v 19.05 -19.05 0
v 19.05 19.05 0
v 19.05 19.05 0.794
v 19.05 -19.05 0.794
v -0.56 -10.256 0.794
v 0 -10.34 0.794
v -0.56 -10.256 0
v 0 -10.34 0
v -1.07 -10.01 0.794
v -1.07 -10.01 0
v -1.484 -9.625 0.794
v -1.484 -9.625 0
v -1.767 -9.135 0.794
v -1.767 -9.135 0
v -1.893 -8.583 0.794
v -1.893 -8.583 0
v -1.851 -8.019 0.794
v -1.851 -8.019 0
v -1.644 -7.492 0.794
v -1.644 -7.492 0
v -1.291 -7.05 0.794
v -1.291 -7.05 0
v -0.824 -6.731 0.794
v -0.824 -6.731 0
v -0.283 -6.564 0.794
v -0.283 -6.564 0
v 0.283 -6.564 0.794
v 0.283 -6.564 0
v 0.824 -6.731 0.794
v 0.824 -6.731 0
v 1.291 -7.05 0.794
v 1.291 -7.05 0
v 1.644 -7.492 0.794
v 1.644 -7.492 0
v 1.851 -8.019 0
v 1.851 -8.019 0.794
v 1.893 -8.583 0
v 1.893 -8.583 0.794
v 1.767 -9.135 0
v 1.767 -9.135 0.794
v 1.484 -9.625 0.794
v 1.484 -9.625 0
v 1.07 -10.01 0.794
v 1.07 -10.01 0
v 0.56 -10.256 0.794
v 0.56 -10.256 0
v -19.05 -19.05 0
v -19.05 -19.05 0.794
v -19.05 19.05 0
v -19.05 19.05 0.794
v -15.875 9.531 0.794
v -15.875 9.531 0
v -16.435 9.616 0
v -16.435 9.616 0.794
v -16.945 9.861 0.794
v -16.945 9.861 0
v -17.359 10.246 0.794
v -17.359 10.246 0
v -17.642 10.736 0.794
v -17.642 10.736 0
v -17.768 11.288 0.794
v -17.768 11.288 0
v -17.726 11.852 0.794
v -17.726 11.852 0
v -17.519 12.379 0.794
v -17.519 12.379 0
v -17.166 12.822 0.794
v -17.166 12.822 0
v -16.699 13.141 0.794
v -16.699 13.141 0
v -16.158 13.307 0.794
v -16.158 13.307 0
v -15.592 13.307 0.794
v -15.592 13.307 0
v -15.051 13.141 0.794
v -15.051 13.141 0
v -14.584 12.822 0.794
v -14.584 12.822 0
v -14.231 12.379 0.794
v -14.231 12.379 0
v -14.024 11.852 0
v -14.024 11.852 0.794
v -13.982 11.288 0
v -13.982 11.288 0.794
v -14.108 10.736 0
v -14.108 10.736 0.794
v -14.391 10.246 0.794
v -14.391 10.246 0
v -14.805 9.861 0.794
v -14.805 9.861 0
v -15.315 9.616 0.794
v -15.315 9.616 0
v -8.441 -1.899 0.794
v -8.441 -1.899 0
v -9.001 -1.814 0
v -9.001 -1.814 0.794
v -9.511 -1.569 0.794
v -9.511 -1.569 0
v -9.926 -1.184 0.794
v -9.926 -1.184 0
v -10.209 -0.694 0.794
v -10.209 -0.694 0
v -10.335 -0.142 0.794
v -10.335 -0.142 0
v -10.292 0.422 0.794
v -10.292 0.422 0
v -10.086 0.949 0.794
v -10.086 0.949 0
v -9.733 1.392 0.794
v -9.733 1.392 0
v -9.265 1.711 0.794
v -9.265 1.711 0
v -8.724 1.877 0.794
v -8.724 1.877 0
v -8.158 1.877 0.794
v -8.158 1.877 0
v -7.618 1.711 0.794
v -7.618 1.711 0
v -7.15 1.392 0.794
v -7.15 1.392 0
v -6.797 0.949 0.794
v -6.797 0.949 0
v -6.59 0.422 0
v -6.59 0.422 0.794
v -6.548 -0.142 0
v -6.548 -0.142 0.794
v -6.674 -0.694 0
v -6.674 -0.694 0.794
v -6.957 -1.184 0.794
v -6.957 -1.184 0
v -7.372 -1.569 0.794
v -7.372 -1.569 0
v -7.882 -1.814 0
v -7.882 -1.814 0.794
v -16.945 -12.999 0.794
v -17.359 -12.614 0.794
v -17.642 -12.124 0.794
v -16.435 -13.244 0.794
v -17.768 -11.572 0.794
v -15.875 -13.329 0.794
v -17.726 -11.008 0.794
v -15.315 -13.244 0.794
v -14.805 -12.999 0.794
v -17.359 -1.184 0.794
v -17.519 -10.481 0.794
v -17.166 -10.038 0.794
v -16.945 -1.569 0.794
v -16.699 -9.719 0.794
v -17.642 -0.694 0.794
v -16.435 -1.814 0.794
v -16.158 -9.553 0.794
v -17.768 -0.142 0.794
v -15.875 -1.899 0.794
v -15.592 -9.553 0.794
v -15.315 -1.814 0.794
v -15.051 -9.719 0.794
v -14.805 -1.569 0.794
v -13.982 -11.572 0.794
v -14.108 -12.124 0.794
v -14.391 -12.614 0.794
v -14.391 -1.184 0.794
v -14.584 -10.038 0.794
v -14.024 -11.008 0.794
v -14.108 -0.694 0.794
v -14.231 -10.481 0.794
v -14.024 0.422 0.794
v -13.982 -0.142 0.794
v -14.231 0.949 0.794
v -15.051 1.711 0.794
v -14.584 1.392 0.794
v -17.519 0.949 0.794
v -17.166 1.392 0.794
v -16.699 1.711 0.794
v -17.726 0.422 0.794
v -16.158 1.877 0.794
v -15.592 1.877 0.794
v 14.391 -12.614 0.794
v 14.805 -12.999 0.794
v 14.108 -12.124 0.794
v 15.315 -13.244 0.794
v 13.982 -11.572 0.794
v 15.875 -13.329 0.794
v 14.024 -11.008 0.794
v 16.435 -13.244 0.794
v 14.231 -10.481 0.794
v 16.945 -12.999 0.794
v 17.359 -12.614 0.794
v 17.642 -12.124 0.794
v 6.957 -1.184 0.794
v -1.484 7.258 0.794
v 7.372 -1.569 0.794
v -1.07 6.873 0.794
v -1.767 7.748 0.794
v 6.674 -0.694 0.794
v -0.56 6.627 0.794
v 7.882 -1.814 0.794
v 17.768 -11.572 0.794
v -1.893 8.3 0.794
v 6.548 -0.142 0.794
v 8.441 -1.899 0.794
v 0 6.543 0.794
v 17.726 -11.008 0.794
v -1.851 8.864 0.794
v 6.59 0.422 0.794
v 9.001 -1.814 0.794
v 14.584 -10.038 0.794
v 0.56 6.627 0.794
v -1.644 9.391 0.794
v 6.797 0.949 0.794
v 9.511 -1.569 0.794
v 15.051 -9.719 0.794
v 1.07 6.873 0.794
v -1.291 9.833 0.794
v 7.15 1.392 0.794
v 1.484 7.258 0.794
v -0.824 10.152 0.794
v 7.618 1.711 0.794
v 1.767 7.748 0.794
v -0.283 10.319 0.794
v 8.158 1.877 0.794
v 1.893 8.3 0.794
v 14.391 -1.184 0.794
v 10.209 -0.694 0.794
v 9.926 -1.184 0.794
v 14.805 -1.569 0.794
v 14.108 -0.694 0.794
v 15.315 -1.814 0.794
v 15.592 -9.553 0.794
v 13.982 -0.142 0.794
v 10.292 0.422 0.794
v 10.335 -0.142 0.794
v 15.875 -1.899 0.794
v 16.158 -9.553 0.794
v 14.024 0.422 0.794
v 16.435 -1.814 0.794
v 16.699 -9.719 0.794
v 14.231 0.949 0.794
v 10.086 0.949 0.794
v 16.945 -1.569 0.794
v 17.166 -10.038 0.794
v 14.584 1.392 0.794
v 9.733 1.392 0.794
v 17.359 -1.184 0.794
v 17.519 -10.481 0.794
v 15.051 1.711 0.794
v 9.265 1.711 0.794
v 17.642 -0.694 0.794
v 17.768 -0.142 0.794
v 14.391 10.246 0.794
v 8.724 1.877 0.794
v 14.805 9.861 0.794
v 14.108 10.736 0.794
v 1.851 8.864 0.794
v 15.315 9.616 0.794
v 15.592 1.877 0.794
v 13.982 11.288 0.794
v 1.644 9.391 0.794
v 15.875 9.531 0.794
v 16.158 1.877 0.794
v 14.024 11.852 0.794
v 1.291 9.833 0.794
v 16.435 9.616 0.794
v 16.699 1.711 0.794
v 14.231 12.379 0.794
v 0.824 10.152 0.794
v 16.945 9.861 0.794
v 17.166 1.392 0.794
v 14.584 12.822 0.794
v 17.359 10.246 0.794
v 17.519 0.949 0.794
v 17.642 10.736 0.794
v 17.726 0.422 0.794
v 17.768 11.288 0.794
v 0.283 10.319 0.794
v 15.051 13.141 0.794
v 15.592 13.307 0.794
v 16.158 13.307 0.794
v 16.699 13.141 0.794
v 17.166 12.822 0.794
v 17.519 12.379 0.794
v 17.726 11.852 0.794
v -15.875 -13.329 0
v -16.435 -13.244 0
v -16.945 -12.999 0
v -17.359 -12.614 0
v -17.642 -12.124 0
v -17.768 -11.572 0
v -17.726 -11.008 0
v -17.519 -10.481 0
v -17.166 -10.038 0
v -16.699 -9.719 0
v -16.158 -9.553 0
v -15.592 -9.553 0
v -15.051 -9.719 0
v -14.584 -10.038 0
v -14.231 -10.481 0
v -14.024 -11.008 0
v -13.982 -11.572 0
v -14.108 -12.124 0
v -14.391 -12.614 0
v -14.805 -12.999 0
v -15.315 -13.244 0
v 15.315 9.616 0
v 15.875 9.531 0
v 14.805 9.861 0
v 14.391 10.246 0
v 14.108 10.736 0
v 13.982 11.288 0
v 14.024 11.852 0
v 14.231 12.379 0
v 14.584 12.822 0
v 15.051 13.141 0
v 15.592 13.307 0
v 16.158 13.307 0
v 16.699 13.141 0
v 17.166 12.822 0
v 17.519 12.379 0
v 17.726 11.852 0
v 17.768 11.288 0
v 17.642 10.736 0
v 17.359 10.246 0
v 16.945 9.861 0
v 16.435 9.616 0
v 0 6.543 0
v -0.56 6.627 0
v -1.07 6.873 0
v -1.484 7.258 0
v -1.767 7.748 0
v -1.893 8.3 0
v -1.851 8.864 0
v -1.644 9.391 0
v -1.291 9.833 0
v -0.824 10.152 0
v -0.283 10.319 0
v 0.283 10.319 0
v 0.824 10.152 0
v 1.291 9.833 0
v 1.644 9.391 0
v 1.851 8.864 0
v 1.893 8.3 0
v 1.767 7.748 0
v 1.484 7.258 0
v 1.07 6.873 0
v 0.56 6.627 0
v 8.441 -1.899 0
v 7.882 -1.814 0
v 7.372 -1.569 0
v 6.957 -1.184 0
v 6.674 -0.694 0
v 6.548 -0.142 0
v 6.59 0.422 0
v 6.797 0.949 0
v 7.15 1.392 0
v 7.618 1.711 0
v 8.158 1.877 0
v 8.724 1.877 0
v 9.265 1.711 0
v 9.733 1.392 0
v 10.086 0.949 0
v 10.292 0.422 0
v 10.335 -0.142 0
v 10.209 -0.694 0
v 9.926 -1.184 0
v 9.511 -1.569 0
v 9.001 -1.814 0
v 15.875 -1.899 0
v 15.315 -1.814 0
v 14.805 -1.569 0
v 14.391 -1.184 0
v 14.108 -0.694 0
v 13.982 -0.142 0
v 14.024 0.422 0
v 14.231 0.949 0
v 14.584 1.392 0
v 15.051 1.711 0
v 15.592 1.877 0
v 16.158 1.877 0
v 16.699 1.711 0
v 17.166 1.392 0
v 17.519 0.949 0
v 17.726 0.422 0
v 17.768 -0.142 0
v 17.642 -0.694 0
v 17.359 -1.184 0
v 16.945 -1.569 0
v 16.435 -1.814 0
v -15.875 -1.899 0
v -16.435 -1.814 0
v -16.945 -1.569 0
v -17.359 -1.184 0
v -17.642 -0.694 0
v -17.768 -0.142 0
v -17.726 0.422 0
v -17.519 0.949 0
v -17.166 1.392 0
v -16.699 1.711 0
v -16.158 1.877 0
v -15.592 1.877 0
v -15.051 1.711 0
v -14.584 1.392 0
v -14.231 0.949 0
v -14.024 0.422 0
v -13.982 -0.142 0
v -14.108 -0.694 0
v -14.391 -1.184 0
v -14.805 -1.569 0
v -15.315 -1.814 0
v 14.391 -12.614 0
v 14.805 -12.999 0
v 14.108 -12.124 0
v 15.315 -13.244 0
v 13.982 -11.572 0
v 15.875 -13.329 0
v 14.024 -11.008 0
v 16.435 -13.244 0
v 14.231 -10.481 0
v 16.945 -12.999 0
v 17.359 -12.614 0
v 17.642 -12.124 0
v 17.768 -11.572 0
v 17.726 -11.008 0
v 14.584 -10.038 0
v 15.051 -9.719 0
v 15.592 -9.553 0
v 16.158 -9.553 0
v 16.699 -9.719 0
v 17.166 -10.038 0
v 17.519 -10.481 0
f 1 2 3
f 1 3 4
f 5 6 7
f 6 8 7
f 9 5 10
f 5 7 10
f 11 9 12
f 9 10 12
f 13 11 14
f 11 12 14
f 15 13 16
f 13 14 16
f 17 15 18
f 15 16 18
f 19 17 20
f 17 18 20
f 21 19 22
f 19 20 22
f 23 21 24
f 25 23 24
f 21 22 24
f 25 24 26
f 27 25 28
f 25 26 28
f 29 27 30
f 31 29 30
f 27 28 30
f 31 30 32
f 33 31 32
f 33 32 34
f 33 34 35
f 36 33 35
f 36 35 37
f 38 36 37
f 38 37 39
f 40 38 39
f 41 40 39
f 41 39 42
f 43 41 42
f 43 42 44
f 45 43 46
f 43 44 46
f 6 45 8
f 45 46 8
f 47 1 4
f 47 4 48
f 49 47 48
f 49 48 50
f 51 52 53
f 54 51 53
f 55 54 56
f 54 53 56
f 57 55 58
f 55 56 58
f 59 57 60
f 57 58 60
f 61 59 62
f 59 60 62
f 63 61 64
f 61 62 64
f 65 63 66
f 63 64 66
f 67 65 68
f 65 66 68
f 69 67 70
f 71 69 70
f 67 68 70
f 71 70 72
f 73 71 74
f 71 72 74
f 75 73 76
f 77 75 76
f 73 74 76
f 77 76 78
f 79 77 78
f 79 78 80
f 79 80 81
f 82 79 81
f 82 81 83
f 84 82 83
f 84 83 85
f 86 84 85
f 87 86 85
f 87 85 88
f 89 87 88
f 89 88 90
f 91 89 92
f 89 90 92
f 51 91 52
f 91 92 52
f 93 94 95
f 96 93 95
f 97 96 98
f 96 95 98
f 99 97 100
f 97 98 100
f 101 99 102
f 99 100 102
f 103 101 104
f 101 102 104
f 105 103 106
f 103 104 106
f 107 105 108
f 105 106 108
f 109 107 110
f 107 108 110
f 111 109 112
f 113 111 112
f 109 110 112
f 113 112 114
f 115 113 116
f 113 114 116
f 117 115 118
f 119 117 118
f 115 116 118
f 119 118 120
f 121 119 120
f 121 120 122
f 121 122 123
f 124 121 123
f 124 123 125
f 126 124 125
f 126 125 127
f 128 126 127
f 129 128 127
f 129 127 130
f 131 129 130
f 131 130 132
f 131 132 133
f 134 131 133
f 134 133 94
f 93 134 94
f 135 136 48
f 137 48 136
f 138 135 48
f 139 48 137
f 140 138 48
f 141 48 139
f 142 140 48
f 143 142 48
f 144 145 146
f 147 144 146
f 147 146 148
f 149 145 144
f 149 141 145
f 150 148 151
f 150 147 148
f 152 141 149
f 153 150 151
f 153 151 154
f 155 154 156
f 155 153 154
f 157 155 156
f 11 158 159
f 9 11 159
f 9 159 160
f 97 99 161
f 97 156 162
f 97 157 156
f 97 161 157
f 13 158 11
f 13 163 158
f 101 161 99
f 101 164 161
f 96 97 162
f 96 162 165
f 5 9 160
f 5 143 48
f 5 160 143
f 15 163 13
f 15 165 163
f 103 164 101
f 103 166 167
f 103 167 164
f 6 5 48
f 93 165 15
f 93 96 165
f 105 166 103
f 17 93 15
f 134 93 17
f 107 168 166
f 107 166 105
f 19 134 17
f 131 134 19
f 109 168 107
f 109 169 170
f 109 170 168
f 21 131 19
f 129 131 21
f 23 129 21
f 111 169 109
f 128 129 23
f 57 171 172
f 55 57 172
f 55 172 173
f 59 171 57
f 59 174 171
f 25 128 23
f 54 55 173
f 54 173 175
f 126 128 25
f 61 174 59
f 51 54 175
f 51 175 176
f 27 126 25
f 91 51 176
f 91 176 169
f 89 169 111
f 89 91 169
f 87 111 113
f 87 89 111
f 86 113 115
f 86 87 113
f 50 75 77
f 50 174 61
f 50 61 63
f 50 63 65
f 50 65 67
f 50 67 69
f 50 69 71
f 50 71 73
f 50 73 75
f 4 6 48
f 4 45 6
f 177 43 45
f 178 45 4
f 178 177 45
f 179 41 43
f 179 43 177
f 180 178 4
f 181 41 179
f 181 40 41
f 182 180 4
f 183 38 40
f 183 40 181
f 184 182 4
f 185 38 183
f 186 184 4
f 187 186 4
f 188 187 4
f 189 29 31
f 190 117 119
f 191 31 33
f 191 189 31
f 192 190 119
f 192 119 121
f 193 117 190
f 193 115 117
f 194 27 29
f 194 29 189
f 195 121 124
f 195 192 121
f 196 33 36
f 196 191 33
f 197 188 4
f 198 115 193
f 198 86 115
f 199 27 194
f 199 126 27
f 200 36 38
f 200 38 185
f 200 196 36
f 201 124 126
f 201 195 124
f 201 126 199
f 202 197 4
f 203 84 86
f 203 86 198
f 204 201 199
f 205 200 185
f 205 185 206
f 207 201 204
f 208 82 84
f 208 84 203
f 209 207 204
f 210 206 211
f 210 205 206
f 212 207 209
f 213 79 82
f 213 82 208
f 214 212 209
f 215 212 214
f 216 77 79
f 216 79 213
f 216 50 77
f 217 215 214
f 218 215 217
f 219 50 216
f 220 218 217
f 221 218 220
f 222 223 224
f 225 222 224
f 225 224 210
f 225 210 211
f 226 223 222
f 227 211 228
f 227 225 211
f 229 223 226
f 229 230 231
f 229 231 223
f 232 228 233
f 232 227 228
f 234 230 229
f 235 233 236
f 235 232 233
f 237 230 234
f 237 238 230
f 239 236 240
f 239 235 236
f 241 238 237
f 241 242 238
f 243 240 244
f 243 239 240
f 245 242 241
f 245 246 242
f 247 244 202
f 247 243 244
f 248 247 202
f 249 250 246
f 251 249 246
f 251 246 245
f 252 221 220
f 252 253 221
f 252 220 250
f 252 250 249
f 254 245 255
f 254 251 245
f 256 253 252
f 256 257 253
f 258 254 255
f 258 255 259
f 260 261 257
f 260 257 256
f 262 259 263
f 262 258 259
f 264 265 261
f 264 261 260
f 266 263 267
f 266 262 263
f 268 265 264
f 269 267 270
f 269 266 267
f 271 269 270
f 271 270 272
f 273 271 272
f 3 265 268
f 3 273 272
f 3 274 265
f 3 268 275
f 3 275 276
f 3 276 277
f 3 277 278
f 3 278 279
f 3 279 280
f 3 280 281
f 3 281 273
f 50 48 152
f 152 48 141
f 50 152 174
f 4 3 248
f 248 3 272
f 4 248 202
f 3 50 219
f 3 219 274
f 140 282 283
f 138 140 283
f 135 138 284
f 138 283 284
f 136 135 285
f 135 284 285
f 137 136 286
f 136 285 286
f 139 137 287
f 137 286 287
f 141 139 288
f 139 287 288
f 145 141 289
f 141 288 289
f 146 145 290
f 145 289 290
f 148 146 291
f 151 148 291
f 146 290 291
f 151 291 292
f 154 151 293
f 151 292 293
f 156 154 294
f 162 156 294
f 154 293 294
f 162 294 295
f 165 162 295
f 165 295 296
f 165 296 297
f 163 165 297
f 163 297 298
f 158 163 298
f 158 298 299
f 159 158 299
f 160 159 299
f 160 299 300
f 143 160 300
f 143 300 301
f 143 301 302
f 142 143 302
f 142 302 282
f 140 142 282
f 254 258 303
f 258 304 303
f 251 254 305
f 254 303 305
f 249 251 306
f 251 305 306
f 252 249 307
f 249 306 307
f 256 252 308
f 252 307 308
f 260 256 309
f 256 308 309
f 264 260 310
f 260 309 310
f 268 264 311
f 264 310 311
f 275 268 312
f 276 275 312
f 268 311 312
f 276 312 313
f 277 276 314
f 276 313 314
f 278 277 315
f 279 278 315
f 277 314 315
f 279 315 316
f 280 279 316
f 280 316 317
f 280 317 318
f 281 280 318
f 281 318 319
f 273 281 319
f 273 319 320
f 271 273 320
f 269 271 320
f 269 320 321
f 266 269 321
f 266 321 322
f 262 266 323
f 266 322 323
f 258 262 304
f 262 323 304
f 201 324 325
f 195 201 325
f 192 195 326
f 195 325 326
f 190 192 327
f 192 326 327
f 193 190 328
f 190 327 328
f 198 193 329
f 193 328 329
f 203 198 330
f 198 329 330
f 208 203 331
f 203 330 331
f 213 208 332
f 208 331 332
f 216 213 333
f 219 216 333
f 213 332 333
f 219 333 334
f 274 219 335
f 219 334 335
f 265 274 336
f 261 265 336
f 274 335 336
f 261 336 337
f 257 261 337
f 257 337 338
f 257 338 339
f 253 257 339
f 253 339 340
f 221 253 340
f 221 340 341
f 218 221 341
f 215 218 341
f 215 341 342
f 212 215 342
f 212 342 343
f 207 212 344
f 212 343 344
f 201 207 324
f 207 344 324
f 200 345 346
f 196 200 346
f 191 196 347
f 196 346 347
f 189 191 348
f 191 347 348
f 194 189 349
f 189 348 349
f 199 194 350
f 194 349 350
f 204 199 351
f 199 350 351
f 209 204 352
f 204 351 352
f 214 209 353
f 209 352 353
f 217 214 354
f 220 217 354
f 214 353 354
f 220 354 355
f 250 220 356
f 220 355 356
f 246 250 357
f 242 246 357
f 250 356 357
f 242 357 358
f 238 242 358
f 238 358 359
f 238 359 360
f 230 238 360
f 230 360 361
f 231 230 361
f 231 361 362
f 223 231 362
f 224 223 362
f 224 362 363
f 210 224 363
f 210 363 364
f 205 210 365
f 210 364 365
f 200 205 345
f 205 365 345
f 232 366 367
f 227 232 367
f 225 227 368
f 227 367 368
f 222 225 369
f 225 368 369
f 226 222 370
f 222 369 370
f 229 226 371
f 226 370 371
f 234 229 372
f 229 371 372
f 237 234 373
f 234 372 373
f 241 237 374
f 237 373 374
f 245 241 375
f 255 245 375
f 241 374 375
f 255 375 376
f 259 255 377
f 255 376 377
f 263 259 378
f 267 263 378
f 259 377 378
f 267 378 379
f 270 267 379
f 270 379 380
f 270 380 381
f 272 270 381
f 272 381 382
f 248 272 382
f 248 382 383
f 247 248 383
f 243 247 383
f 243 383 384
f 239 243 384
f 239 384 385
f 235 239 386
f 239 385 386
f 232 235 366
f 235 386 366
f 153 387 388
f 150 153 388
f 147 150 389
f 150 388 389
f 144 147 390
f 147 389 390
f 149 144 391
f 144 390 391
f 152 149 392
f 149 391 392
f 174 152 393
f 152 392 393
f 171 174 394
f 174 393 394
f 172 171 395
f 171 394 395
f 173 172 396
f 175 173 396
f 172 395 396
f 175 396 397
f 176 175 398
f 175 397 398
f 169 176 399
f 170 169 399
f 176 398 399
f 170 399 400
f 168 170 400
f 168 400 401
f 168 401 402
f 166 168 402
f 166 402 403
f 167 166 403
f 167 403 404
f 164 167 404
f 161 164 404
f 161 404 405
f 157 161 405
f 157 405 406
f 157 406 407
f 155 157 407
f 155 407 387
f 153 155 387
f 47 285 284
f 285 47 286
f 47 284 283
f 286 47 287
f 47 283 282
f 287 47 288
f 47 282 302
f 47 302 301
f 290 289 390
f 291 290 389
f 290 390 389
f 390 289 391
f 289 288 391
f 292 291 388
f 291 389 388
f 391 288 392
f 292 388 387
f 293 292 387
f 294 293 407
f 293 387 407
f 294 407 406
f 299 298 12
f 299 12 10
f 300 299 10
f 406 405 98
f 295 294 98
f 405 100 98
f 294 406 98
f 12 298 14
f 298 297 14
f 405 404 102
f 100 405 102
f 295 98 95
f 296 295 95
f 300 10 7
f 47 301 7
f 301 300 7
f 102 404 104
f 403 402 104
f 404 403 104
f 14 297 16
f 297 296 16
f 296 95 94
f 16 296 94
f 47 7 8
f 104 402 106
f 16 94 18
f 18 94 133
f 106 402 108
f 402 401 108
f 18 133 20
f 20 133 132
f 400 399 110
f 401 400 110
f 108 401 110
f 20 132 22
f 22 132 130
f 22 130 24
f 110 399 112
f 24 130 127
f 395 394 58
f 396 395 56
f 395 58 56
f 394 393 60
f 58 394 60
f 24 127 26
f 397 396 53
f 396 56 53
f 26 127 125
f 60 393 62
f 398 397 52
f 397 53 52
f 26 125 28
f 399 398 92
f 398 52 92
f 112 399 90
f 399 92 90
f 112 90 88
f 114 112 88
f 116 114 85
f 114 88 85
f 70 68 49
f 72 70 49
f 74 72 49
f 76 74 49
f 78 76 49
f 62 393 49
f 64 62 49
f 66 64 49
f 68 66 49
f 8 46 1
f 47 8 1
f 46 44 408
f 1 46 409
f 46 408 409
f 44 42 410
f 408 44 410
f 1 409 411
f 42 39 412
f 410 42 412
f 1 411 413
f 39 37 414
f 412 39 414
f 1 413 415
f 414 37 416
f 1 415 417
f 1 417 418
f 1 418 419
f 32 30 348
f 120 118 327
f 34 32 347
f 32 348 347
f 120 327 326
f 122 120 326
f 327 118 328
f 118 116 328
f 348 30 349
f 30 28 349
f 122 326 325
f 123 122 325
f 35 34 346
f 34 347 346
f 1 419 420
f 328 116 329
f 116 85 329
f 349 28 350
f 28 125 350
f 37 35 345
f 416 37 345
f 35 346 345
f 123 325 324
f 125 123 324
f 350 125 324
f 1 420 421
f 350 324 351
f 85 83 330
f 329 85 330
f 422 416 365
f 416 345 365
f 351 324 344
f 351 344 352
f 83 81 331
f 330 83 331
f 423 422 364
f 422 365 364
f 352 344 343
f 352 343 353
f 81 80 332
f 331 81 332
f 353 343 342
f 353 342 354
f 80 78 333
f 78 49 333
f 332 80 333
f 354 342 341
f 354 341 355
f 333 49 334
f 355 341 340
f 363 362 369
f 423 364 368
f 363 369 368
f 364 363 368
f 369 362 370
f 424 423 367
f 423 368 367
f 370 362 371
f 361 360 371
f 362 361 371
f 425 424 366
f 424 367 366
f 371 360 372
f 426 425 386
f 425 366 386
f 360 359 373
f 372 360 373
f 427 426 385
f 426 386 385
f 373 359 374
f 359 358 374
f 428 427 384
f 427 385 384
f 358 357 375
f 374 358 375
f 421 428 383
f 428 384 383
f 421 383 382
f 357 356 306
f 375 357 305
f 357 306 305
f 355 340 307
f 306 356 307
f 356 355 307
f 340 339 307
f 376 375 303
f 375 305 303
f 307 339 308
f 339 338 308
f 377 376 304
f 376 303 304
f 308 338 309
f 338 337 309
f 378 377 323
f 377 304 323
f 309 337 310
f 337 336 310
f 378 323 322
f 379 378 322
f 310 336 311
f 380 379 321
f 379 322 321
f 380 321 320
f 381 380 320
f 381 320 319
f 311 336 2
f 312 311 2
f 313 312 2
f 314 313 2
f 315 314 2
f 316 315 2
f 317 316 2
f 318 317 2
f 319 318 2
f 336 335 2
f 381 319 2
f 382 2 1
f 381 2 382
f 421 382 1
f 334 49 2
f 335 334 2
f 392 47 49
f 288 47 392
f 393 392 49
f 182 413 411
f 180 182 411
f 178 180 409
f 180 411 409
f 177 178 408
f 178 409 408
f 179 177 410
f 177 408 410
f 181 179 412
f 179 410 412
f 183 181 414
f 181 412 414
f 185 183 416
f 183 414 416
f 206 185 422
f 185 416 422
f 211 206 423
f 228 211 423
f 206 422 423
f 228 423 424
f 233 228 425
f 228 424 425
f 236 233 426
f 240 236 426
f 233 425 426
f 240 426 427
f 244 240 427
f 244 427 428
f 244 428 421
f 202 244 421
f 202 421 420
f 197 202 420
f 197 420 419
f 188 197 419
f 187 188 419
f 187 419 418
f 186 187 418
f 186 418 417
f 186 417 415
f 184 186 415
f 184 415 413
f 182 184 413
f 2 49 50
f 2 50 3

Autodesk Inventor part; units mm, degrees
ref_plane "YZ Plane" through (0, 0, 0) normal (1, 0, 0) x (0, 1, 0)
ref_plane "XZ Plane" through (0, 0, 0) normal (0, 1, 0) x (-1, 0, 0)
ref_plane "XY Plane" through (0, 0, 0) normal (0, 0, 1) x (1, 0, 0)
sketch "adapter-hole-geometry" plane through (0, 0, 0) normal (0, 0, 1) x (1, 0, 0)
  line L0 (15.875, -11.43) -> (-15.875, -11.43) construction
  line L1 (-15.875, -11.43) -> (-15.875, 11.43) construction
  line L2 (-15.875, 11.43) -> (15.875, 11.43) construction
  line L3 (15.875, 11.43) -> (15.875, -11.43) construction
  line L4 (15.875, -11.43) -> (-15.875, 11.43) construction
  line L5 (-15.875, -11.43) -> (15.875, 11.43) construction
  line L6 (11.43, -15.875) -> (-11.43, -15.875) construction
  line L7 (-11.43, -15.875) -> (-11.43, 15.875) construction
  line L8 (-11.43, 15.875) -> (11.43, 15.875) construction
  line L9 (11.43, 15.875) -> (11.43, -15.875) construction
  line L10 (11.43, -15.875) -> (-11.43, 15.875) construction
  line L11 (-11.43, -15.875) -> (11.43, 15.875) construction
  line L12 (0, -8.4414) -> (8.4414, 0) construction
  line L13 (8.4414, 0) -> (0, 8.4414) construction
  line L14 (0, 8.4414) -> (-8.4414, 0) construction
  line L15 (-8.4414, 0) -> (0, -8.4414) construction
  line L16 (-5.969, -5.969) -> (5.969, 5.969) construction
  line L17 (5.969, -5.969) -> (-5.969, 5.969) construction
  line L18 (-8.4414, -8.4414) -> (8.4414, -8.4414) construction
  line L19 (8.4414, -8.4414) -> (8.4414, 8.4414) construction
  line L20 (8.4414, 8.4414) -> (-8.4414, 8.4414) construction
  line L21 (-8.4414, 8.4414) -> (-8.4414, -8.4414) construction
  line L22 (-8.4414, -8.4414) -> (8.4414, 8.4414) construction
  line L23 (8.4414, -8.4414) -> (-8.4414, 8.4414) construction
  point P0 (0, 0)
  point P1 (0, 8.4414)
  point P2 (8.4414, 0)
  dimension "d29" = 31.75
  dimension "d30" = 22.86
  dimension "d31" = 22.86
  dimension "d32" = 31.75
  dimension "d33" = 11.938
  dimension "d34" = 11.938
  dimension "d42" = 16.8829
  dimension "d43" = 16.8829
  dimension "d58" = 4.445
  dimension "d59" = 7.4336
  dimension "d60" = 5.969
  dimension "d61" = 5.969
  dimension "d62" = 4.445
  dimension "d63" = 7.4336
  dimension "d64" = 9.906
  dimension "d65" = 9.906
  dimension "d66" = 15.875
  dimension "d67" = 5.969
  dimension "d68" = 21.844
  dimension "d69" = 21.844
sketch "Sketch1" plane through (0, 0, 0) normal (0, 0, 1) x (1, 0, 0)
  line L0 (19.05, -19.05) -> (-19.05, -19.05)
  line L1 (-19.05, -19.05) -> (-19.05, 19.05)
  line L2 (-19.05, 19.05) -> (19.05, 19.05)
  line L3 (19.05, 19.05) -> (19.05, -19.05)
  line L4 (19.05, -19.05) -> (-19.05, 19.05) construction
  line L5 (-19.05, -19.05) -> (19.05, 19.05) construction
  point P0 (0, 0)
  dimension "d0" = 38.1
  dimension "d1" = 38.1
extrude "Extrusion1" add sketch "Sketch1" along normal blind 0.7937
sketch "Sketch4" plane through (0, 0, 0.7937) normal (0, 0, 1) x (1, 0, 0)
  line L0 (-19.05, -19.05) -> (19.05, -19.05) construction
  line L1 (19.05, -19.05) -> (19.05, 19.05) construction
  line L2 (19.05, 19.05) -> (-19.05, 19.05) construction
  line L3 (-19.05, 19.05) -> (-19.05, -19.05) construction
  point P0 (0, 0)
  point P1 (-15.875, 11.43)
  point P2 (-15.875, 0)
  point P3 (-15.875, -11.43)
  point P4 (15.875, -11.43)
  point P5 (15.875, 0)
  point P6 (15.875, 11.43)
  point P7 (0, 8.4414)
  point P8 (-8.4414, 0)
  point P9 (0, -8.4414)
  point P10 (8.4414, 0)
  dimension "d44" = 3.175
  dimension "d45" = 3.175
  dimension "d46" = 7.62
  dimension "d47" = 3.175
  dimension "d48" = 7.62
  dimension "d49" = 3.175
  dimension "d50" = 7.62
hole "Hole3" at (-15.875, 11.43, 0.7937) at (-15.875, 0, 0.7937) at (-15.875, -11.43, 0.7937) at (15.875, -11.43, 0.7937) at (15.875, 0, 0.7937) at (15.875, 11.43, 0.7937) at (0, 8.4414, 0.7937) at (-8.4414, 0, 0.7937) at (0, -8.4414, 0.7937) at (8.4414, 0, 0.7937) direction (0, 0, -1) diameter 3.7973 end through all
properties part number "goniometer_stage_shim_v1" material "Stainless Steel AISI 304"
